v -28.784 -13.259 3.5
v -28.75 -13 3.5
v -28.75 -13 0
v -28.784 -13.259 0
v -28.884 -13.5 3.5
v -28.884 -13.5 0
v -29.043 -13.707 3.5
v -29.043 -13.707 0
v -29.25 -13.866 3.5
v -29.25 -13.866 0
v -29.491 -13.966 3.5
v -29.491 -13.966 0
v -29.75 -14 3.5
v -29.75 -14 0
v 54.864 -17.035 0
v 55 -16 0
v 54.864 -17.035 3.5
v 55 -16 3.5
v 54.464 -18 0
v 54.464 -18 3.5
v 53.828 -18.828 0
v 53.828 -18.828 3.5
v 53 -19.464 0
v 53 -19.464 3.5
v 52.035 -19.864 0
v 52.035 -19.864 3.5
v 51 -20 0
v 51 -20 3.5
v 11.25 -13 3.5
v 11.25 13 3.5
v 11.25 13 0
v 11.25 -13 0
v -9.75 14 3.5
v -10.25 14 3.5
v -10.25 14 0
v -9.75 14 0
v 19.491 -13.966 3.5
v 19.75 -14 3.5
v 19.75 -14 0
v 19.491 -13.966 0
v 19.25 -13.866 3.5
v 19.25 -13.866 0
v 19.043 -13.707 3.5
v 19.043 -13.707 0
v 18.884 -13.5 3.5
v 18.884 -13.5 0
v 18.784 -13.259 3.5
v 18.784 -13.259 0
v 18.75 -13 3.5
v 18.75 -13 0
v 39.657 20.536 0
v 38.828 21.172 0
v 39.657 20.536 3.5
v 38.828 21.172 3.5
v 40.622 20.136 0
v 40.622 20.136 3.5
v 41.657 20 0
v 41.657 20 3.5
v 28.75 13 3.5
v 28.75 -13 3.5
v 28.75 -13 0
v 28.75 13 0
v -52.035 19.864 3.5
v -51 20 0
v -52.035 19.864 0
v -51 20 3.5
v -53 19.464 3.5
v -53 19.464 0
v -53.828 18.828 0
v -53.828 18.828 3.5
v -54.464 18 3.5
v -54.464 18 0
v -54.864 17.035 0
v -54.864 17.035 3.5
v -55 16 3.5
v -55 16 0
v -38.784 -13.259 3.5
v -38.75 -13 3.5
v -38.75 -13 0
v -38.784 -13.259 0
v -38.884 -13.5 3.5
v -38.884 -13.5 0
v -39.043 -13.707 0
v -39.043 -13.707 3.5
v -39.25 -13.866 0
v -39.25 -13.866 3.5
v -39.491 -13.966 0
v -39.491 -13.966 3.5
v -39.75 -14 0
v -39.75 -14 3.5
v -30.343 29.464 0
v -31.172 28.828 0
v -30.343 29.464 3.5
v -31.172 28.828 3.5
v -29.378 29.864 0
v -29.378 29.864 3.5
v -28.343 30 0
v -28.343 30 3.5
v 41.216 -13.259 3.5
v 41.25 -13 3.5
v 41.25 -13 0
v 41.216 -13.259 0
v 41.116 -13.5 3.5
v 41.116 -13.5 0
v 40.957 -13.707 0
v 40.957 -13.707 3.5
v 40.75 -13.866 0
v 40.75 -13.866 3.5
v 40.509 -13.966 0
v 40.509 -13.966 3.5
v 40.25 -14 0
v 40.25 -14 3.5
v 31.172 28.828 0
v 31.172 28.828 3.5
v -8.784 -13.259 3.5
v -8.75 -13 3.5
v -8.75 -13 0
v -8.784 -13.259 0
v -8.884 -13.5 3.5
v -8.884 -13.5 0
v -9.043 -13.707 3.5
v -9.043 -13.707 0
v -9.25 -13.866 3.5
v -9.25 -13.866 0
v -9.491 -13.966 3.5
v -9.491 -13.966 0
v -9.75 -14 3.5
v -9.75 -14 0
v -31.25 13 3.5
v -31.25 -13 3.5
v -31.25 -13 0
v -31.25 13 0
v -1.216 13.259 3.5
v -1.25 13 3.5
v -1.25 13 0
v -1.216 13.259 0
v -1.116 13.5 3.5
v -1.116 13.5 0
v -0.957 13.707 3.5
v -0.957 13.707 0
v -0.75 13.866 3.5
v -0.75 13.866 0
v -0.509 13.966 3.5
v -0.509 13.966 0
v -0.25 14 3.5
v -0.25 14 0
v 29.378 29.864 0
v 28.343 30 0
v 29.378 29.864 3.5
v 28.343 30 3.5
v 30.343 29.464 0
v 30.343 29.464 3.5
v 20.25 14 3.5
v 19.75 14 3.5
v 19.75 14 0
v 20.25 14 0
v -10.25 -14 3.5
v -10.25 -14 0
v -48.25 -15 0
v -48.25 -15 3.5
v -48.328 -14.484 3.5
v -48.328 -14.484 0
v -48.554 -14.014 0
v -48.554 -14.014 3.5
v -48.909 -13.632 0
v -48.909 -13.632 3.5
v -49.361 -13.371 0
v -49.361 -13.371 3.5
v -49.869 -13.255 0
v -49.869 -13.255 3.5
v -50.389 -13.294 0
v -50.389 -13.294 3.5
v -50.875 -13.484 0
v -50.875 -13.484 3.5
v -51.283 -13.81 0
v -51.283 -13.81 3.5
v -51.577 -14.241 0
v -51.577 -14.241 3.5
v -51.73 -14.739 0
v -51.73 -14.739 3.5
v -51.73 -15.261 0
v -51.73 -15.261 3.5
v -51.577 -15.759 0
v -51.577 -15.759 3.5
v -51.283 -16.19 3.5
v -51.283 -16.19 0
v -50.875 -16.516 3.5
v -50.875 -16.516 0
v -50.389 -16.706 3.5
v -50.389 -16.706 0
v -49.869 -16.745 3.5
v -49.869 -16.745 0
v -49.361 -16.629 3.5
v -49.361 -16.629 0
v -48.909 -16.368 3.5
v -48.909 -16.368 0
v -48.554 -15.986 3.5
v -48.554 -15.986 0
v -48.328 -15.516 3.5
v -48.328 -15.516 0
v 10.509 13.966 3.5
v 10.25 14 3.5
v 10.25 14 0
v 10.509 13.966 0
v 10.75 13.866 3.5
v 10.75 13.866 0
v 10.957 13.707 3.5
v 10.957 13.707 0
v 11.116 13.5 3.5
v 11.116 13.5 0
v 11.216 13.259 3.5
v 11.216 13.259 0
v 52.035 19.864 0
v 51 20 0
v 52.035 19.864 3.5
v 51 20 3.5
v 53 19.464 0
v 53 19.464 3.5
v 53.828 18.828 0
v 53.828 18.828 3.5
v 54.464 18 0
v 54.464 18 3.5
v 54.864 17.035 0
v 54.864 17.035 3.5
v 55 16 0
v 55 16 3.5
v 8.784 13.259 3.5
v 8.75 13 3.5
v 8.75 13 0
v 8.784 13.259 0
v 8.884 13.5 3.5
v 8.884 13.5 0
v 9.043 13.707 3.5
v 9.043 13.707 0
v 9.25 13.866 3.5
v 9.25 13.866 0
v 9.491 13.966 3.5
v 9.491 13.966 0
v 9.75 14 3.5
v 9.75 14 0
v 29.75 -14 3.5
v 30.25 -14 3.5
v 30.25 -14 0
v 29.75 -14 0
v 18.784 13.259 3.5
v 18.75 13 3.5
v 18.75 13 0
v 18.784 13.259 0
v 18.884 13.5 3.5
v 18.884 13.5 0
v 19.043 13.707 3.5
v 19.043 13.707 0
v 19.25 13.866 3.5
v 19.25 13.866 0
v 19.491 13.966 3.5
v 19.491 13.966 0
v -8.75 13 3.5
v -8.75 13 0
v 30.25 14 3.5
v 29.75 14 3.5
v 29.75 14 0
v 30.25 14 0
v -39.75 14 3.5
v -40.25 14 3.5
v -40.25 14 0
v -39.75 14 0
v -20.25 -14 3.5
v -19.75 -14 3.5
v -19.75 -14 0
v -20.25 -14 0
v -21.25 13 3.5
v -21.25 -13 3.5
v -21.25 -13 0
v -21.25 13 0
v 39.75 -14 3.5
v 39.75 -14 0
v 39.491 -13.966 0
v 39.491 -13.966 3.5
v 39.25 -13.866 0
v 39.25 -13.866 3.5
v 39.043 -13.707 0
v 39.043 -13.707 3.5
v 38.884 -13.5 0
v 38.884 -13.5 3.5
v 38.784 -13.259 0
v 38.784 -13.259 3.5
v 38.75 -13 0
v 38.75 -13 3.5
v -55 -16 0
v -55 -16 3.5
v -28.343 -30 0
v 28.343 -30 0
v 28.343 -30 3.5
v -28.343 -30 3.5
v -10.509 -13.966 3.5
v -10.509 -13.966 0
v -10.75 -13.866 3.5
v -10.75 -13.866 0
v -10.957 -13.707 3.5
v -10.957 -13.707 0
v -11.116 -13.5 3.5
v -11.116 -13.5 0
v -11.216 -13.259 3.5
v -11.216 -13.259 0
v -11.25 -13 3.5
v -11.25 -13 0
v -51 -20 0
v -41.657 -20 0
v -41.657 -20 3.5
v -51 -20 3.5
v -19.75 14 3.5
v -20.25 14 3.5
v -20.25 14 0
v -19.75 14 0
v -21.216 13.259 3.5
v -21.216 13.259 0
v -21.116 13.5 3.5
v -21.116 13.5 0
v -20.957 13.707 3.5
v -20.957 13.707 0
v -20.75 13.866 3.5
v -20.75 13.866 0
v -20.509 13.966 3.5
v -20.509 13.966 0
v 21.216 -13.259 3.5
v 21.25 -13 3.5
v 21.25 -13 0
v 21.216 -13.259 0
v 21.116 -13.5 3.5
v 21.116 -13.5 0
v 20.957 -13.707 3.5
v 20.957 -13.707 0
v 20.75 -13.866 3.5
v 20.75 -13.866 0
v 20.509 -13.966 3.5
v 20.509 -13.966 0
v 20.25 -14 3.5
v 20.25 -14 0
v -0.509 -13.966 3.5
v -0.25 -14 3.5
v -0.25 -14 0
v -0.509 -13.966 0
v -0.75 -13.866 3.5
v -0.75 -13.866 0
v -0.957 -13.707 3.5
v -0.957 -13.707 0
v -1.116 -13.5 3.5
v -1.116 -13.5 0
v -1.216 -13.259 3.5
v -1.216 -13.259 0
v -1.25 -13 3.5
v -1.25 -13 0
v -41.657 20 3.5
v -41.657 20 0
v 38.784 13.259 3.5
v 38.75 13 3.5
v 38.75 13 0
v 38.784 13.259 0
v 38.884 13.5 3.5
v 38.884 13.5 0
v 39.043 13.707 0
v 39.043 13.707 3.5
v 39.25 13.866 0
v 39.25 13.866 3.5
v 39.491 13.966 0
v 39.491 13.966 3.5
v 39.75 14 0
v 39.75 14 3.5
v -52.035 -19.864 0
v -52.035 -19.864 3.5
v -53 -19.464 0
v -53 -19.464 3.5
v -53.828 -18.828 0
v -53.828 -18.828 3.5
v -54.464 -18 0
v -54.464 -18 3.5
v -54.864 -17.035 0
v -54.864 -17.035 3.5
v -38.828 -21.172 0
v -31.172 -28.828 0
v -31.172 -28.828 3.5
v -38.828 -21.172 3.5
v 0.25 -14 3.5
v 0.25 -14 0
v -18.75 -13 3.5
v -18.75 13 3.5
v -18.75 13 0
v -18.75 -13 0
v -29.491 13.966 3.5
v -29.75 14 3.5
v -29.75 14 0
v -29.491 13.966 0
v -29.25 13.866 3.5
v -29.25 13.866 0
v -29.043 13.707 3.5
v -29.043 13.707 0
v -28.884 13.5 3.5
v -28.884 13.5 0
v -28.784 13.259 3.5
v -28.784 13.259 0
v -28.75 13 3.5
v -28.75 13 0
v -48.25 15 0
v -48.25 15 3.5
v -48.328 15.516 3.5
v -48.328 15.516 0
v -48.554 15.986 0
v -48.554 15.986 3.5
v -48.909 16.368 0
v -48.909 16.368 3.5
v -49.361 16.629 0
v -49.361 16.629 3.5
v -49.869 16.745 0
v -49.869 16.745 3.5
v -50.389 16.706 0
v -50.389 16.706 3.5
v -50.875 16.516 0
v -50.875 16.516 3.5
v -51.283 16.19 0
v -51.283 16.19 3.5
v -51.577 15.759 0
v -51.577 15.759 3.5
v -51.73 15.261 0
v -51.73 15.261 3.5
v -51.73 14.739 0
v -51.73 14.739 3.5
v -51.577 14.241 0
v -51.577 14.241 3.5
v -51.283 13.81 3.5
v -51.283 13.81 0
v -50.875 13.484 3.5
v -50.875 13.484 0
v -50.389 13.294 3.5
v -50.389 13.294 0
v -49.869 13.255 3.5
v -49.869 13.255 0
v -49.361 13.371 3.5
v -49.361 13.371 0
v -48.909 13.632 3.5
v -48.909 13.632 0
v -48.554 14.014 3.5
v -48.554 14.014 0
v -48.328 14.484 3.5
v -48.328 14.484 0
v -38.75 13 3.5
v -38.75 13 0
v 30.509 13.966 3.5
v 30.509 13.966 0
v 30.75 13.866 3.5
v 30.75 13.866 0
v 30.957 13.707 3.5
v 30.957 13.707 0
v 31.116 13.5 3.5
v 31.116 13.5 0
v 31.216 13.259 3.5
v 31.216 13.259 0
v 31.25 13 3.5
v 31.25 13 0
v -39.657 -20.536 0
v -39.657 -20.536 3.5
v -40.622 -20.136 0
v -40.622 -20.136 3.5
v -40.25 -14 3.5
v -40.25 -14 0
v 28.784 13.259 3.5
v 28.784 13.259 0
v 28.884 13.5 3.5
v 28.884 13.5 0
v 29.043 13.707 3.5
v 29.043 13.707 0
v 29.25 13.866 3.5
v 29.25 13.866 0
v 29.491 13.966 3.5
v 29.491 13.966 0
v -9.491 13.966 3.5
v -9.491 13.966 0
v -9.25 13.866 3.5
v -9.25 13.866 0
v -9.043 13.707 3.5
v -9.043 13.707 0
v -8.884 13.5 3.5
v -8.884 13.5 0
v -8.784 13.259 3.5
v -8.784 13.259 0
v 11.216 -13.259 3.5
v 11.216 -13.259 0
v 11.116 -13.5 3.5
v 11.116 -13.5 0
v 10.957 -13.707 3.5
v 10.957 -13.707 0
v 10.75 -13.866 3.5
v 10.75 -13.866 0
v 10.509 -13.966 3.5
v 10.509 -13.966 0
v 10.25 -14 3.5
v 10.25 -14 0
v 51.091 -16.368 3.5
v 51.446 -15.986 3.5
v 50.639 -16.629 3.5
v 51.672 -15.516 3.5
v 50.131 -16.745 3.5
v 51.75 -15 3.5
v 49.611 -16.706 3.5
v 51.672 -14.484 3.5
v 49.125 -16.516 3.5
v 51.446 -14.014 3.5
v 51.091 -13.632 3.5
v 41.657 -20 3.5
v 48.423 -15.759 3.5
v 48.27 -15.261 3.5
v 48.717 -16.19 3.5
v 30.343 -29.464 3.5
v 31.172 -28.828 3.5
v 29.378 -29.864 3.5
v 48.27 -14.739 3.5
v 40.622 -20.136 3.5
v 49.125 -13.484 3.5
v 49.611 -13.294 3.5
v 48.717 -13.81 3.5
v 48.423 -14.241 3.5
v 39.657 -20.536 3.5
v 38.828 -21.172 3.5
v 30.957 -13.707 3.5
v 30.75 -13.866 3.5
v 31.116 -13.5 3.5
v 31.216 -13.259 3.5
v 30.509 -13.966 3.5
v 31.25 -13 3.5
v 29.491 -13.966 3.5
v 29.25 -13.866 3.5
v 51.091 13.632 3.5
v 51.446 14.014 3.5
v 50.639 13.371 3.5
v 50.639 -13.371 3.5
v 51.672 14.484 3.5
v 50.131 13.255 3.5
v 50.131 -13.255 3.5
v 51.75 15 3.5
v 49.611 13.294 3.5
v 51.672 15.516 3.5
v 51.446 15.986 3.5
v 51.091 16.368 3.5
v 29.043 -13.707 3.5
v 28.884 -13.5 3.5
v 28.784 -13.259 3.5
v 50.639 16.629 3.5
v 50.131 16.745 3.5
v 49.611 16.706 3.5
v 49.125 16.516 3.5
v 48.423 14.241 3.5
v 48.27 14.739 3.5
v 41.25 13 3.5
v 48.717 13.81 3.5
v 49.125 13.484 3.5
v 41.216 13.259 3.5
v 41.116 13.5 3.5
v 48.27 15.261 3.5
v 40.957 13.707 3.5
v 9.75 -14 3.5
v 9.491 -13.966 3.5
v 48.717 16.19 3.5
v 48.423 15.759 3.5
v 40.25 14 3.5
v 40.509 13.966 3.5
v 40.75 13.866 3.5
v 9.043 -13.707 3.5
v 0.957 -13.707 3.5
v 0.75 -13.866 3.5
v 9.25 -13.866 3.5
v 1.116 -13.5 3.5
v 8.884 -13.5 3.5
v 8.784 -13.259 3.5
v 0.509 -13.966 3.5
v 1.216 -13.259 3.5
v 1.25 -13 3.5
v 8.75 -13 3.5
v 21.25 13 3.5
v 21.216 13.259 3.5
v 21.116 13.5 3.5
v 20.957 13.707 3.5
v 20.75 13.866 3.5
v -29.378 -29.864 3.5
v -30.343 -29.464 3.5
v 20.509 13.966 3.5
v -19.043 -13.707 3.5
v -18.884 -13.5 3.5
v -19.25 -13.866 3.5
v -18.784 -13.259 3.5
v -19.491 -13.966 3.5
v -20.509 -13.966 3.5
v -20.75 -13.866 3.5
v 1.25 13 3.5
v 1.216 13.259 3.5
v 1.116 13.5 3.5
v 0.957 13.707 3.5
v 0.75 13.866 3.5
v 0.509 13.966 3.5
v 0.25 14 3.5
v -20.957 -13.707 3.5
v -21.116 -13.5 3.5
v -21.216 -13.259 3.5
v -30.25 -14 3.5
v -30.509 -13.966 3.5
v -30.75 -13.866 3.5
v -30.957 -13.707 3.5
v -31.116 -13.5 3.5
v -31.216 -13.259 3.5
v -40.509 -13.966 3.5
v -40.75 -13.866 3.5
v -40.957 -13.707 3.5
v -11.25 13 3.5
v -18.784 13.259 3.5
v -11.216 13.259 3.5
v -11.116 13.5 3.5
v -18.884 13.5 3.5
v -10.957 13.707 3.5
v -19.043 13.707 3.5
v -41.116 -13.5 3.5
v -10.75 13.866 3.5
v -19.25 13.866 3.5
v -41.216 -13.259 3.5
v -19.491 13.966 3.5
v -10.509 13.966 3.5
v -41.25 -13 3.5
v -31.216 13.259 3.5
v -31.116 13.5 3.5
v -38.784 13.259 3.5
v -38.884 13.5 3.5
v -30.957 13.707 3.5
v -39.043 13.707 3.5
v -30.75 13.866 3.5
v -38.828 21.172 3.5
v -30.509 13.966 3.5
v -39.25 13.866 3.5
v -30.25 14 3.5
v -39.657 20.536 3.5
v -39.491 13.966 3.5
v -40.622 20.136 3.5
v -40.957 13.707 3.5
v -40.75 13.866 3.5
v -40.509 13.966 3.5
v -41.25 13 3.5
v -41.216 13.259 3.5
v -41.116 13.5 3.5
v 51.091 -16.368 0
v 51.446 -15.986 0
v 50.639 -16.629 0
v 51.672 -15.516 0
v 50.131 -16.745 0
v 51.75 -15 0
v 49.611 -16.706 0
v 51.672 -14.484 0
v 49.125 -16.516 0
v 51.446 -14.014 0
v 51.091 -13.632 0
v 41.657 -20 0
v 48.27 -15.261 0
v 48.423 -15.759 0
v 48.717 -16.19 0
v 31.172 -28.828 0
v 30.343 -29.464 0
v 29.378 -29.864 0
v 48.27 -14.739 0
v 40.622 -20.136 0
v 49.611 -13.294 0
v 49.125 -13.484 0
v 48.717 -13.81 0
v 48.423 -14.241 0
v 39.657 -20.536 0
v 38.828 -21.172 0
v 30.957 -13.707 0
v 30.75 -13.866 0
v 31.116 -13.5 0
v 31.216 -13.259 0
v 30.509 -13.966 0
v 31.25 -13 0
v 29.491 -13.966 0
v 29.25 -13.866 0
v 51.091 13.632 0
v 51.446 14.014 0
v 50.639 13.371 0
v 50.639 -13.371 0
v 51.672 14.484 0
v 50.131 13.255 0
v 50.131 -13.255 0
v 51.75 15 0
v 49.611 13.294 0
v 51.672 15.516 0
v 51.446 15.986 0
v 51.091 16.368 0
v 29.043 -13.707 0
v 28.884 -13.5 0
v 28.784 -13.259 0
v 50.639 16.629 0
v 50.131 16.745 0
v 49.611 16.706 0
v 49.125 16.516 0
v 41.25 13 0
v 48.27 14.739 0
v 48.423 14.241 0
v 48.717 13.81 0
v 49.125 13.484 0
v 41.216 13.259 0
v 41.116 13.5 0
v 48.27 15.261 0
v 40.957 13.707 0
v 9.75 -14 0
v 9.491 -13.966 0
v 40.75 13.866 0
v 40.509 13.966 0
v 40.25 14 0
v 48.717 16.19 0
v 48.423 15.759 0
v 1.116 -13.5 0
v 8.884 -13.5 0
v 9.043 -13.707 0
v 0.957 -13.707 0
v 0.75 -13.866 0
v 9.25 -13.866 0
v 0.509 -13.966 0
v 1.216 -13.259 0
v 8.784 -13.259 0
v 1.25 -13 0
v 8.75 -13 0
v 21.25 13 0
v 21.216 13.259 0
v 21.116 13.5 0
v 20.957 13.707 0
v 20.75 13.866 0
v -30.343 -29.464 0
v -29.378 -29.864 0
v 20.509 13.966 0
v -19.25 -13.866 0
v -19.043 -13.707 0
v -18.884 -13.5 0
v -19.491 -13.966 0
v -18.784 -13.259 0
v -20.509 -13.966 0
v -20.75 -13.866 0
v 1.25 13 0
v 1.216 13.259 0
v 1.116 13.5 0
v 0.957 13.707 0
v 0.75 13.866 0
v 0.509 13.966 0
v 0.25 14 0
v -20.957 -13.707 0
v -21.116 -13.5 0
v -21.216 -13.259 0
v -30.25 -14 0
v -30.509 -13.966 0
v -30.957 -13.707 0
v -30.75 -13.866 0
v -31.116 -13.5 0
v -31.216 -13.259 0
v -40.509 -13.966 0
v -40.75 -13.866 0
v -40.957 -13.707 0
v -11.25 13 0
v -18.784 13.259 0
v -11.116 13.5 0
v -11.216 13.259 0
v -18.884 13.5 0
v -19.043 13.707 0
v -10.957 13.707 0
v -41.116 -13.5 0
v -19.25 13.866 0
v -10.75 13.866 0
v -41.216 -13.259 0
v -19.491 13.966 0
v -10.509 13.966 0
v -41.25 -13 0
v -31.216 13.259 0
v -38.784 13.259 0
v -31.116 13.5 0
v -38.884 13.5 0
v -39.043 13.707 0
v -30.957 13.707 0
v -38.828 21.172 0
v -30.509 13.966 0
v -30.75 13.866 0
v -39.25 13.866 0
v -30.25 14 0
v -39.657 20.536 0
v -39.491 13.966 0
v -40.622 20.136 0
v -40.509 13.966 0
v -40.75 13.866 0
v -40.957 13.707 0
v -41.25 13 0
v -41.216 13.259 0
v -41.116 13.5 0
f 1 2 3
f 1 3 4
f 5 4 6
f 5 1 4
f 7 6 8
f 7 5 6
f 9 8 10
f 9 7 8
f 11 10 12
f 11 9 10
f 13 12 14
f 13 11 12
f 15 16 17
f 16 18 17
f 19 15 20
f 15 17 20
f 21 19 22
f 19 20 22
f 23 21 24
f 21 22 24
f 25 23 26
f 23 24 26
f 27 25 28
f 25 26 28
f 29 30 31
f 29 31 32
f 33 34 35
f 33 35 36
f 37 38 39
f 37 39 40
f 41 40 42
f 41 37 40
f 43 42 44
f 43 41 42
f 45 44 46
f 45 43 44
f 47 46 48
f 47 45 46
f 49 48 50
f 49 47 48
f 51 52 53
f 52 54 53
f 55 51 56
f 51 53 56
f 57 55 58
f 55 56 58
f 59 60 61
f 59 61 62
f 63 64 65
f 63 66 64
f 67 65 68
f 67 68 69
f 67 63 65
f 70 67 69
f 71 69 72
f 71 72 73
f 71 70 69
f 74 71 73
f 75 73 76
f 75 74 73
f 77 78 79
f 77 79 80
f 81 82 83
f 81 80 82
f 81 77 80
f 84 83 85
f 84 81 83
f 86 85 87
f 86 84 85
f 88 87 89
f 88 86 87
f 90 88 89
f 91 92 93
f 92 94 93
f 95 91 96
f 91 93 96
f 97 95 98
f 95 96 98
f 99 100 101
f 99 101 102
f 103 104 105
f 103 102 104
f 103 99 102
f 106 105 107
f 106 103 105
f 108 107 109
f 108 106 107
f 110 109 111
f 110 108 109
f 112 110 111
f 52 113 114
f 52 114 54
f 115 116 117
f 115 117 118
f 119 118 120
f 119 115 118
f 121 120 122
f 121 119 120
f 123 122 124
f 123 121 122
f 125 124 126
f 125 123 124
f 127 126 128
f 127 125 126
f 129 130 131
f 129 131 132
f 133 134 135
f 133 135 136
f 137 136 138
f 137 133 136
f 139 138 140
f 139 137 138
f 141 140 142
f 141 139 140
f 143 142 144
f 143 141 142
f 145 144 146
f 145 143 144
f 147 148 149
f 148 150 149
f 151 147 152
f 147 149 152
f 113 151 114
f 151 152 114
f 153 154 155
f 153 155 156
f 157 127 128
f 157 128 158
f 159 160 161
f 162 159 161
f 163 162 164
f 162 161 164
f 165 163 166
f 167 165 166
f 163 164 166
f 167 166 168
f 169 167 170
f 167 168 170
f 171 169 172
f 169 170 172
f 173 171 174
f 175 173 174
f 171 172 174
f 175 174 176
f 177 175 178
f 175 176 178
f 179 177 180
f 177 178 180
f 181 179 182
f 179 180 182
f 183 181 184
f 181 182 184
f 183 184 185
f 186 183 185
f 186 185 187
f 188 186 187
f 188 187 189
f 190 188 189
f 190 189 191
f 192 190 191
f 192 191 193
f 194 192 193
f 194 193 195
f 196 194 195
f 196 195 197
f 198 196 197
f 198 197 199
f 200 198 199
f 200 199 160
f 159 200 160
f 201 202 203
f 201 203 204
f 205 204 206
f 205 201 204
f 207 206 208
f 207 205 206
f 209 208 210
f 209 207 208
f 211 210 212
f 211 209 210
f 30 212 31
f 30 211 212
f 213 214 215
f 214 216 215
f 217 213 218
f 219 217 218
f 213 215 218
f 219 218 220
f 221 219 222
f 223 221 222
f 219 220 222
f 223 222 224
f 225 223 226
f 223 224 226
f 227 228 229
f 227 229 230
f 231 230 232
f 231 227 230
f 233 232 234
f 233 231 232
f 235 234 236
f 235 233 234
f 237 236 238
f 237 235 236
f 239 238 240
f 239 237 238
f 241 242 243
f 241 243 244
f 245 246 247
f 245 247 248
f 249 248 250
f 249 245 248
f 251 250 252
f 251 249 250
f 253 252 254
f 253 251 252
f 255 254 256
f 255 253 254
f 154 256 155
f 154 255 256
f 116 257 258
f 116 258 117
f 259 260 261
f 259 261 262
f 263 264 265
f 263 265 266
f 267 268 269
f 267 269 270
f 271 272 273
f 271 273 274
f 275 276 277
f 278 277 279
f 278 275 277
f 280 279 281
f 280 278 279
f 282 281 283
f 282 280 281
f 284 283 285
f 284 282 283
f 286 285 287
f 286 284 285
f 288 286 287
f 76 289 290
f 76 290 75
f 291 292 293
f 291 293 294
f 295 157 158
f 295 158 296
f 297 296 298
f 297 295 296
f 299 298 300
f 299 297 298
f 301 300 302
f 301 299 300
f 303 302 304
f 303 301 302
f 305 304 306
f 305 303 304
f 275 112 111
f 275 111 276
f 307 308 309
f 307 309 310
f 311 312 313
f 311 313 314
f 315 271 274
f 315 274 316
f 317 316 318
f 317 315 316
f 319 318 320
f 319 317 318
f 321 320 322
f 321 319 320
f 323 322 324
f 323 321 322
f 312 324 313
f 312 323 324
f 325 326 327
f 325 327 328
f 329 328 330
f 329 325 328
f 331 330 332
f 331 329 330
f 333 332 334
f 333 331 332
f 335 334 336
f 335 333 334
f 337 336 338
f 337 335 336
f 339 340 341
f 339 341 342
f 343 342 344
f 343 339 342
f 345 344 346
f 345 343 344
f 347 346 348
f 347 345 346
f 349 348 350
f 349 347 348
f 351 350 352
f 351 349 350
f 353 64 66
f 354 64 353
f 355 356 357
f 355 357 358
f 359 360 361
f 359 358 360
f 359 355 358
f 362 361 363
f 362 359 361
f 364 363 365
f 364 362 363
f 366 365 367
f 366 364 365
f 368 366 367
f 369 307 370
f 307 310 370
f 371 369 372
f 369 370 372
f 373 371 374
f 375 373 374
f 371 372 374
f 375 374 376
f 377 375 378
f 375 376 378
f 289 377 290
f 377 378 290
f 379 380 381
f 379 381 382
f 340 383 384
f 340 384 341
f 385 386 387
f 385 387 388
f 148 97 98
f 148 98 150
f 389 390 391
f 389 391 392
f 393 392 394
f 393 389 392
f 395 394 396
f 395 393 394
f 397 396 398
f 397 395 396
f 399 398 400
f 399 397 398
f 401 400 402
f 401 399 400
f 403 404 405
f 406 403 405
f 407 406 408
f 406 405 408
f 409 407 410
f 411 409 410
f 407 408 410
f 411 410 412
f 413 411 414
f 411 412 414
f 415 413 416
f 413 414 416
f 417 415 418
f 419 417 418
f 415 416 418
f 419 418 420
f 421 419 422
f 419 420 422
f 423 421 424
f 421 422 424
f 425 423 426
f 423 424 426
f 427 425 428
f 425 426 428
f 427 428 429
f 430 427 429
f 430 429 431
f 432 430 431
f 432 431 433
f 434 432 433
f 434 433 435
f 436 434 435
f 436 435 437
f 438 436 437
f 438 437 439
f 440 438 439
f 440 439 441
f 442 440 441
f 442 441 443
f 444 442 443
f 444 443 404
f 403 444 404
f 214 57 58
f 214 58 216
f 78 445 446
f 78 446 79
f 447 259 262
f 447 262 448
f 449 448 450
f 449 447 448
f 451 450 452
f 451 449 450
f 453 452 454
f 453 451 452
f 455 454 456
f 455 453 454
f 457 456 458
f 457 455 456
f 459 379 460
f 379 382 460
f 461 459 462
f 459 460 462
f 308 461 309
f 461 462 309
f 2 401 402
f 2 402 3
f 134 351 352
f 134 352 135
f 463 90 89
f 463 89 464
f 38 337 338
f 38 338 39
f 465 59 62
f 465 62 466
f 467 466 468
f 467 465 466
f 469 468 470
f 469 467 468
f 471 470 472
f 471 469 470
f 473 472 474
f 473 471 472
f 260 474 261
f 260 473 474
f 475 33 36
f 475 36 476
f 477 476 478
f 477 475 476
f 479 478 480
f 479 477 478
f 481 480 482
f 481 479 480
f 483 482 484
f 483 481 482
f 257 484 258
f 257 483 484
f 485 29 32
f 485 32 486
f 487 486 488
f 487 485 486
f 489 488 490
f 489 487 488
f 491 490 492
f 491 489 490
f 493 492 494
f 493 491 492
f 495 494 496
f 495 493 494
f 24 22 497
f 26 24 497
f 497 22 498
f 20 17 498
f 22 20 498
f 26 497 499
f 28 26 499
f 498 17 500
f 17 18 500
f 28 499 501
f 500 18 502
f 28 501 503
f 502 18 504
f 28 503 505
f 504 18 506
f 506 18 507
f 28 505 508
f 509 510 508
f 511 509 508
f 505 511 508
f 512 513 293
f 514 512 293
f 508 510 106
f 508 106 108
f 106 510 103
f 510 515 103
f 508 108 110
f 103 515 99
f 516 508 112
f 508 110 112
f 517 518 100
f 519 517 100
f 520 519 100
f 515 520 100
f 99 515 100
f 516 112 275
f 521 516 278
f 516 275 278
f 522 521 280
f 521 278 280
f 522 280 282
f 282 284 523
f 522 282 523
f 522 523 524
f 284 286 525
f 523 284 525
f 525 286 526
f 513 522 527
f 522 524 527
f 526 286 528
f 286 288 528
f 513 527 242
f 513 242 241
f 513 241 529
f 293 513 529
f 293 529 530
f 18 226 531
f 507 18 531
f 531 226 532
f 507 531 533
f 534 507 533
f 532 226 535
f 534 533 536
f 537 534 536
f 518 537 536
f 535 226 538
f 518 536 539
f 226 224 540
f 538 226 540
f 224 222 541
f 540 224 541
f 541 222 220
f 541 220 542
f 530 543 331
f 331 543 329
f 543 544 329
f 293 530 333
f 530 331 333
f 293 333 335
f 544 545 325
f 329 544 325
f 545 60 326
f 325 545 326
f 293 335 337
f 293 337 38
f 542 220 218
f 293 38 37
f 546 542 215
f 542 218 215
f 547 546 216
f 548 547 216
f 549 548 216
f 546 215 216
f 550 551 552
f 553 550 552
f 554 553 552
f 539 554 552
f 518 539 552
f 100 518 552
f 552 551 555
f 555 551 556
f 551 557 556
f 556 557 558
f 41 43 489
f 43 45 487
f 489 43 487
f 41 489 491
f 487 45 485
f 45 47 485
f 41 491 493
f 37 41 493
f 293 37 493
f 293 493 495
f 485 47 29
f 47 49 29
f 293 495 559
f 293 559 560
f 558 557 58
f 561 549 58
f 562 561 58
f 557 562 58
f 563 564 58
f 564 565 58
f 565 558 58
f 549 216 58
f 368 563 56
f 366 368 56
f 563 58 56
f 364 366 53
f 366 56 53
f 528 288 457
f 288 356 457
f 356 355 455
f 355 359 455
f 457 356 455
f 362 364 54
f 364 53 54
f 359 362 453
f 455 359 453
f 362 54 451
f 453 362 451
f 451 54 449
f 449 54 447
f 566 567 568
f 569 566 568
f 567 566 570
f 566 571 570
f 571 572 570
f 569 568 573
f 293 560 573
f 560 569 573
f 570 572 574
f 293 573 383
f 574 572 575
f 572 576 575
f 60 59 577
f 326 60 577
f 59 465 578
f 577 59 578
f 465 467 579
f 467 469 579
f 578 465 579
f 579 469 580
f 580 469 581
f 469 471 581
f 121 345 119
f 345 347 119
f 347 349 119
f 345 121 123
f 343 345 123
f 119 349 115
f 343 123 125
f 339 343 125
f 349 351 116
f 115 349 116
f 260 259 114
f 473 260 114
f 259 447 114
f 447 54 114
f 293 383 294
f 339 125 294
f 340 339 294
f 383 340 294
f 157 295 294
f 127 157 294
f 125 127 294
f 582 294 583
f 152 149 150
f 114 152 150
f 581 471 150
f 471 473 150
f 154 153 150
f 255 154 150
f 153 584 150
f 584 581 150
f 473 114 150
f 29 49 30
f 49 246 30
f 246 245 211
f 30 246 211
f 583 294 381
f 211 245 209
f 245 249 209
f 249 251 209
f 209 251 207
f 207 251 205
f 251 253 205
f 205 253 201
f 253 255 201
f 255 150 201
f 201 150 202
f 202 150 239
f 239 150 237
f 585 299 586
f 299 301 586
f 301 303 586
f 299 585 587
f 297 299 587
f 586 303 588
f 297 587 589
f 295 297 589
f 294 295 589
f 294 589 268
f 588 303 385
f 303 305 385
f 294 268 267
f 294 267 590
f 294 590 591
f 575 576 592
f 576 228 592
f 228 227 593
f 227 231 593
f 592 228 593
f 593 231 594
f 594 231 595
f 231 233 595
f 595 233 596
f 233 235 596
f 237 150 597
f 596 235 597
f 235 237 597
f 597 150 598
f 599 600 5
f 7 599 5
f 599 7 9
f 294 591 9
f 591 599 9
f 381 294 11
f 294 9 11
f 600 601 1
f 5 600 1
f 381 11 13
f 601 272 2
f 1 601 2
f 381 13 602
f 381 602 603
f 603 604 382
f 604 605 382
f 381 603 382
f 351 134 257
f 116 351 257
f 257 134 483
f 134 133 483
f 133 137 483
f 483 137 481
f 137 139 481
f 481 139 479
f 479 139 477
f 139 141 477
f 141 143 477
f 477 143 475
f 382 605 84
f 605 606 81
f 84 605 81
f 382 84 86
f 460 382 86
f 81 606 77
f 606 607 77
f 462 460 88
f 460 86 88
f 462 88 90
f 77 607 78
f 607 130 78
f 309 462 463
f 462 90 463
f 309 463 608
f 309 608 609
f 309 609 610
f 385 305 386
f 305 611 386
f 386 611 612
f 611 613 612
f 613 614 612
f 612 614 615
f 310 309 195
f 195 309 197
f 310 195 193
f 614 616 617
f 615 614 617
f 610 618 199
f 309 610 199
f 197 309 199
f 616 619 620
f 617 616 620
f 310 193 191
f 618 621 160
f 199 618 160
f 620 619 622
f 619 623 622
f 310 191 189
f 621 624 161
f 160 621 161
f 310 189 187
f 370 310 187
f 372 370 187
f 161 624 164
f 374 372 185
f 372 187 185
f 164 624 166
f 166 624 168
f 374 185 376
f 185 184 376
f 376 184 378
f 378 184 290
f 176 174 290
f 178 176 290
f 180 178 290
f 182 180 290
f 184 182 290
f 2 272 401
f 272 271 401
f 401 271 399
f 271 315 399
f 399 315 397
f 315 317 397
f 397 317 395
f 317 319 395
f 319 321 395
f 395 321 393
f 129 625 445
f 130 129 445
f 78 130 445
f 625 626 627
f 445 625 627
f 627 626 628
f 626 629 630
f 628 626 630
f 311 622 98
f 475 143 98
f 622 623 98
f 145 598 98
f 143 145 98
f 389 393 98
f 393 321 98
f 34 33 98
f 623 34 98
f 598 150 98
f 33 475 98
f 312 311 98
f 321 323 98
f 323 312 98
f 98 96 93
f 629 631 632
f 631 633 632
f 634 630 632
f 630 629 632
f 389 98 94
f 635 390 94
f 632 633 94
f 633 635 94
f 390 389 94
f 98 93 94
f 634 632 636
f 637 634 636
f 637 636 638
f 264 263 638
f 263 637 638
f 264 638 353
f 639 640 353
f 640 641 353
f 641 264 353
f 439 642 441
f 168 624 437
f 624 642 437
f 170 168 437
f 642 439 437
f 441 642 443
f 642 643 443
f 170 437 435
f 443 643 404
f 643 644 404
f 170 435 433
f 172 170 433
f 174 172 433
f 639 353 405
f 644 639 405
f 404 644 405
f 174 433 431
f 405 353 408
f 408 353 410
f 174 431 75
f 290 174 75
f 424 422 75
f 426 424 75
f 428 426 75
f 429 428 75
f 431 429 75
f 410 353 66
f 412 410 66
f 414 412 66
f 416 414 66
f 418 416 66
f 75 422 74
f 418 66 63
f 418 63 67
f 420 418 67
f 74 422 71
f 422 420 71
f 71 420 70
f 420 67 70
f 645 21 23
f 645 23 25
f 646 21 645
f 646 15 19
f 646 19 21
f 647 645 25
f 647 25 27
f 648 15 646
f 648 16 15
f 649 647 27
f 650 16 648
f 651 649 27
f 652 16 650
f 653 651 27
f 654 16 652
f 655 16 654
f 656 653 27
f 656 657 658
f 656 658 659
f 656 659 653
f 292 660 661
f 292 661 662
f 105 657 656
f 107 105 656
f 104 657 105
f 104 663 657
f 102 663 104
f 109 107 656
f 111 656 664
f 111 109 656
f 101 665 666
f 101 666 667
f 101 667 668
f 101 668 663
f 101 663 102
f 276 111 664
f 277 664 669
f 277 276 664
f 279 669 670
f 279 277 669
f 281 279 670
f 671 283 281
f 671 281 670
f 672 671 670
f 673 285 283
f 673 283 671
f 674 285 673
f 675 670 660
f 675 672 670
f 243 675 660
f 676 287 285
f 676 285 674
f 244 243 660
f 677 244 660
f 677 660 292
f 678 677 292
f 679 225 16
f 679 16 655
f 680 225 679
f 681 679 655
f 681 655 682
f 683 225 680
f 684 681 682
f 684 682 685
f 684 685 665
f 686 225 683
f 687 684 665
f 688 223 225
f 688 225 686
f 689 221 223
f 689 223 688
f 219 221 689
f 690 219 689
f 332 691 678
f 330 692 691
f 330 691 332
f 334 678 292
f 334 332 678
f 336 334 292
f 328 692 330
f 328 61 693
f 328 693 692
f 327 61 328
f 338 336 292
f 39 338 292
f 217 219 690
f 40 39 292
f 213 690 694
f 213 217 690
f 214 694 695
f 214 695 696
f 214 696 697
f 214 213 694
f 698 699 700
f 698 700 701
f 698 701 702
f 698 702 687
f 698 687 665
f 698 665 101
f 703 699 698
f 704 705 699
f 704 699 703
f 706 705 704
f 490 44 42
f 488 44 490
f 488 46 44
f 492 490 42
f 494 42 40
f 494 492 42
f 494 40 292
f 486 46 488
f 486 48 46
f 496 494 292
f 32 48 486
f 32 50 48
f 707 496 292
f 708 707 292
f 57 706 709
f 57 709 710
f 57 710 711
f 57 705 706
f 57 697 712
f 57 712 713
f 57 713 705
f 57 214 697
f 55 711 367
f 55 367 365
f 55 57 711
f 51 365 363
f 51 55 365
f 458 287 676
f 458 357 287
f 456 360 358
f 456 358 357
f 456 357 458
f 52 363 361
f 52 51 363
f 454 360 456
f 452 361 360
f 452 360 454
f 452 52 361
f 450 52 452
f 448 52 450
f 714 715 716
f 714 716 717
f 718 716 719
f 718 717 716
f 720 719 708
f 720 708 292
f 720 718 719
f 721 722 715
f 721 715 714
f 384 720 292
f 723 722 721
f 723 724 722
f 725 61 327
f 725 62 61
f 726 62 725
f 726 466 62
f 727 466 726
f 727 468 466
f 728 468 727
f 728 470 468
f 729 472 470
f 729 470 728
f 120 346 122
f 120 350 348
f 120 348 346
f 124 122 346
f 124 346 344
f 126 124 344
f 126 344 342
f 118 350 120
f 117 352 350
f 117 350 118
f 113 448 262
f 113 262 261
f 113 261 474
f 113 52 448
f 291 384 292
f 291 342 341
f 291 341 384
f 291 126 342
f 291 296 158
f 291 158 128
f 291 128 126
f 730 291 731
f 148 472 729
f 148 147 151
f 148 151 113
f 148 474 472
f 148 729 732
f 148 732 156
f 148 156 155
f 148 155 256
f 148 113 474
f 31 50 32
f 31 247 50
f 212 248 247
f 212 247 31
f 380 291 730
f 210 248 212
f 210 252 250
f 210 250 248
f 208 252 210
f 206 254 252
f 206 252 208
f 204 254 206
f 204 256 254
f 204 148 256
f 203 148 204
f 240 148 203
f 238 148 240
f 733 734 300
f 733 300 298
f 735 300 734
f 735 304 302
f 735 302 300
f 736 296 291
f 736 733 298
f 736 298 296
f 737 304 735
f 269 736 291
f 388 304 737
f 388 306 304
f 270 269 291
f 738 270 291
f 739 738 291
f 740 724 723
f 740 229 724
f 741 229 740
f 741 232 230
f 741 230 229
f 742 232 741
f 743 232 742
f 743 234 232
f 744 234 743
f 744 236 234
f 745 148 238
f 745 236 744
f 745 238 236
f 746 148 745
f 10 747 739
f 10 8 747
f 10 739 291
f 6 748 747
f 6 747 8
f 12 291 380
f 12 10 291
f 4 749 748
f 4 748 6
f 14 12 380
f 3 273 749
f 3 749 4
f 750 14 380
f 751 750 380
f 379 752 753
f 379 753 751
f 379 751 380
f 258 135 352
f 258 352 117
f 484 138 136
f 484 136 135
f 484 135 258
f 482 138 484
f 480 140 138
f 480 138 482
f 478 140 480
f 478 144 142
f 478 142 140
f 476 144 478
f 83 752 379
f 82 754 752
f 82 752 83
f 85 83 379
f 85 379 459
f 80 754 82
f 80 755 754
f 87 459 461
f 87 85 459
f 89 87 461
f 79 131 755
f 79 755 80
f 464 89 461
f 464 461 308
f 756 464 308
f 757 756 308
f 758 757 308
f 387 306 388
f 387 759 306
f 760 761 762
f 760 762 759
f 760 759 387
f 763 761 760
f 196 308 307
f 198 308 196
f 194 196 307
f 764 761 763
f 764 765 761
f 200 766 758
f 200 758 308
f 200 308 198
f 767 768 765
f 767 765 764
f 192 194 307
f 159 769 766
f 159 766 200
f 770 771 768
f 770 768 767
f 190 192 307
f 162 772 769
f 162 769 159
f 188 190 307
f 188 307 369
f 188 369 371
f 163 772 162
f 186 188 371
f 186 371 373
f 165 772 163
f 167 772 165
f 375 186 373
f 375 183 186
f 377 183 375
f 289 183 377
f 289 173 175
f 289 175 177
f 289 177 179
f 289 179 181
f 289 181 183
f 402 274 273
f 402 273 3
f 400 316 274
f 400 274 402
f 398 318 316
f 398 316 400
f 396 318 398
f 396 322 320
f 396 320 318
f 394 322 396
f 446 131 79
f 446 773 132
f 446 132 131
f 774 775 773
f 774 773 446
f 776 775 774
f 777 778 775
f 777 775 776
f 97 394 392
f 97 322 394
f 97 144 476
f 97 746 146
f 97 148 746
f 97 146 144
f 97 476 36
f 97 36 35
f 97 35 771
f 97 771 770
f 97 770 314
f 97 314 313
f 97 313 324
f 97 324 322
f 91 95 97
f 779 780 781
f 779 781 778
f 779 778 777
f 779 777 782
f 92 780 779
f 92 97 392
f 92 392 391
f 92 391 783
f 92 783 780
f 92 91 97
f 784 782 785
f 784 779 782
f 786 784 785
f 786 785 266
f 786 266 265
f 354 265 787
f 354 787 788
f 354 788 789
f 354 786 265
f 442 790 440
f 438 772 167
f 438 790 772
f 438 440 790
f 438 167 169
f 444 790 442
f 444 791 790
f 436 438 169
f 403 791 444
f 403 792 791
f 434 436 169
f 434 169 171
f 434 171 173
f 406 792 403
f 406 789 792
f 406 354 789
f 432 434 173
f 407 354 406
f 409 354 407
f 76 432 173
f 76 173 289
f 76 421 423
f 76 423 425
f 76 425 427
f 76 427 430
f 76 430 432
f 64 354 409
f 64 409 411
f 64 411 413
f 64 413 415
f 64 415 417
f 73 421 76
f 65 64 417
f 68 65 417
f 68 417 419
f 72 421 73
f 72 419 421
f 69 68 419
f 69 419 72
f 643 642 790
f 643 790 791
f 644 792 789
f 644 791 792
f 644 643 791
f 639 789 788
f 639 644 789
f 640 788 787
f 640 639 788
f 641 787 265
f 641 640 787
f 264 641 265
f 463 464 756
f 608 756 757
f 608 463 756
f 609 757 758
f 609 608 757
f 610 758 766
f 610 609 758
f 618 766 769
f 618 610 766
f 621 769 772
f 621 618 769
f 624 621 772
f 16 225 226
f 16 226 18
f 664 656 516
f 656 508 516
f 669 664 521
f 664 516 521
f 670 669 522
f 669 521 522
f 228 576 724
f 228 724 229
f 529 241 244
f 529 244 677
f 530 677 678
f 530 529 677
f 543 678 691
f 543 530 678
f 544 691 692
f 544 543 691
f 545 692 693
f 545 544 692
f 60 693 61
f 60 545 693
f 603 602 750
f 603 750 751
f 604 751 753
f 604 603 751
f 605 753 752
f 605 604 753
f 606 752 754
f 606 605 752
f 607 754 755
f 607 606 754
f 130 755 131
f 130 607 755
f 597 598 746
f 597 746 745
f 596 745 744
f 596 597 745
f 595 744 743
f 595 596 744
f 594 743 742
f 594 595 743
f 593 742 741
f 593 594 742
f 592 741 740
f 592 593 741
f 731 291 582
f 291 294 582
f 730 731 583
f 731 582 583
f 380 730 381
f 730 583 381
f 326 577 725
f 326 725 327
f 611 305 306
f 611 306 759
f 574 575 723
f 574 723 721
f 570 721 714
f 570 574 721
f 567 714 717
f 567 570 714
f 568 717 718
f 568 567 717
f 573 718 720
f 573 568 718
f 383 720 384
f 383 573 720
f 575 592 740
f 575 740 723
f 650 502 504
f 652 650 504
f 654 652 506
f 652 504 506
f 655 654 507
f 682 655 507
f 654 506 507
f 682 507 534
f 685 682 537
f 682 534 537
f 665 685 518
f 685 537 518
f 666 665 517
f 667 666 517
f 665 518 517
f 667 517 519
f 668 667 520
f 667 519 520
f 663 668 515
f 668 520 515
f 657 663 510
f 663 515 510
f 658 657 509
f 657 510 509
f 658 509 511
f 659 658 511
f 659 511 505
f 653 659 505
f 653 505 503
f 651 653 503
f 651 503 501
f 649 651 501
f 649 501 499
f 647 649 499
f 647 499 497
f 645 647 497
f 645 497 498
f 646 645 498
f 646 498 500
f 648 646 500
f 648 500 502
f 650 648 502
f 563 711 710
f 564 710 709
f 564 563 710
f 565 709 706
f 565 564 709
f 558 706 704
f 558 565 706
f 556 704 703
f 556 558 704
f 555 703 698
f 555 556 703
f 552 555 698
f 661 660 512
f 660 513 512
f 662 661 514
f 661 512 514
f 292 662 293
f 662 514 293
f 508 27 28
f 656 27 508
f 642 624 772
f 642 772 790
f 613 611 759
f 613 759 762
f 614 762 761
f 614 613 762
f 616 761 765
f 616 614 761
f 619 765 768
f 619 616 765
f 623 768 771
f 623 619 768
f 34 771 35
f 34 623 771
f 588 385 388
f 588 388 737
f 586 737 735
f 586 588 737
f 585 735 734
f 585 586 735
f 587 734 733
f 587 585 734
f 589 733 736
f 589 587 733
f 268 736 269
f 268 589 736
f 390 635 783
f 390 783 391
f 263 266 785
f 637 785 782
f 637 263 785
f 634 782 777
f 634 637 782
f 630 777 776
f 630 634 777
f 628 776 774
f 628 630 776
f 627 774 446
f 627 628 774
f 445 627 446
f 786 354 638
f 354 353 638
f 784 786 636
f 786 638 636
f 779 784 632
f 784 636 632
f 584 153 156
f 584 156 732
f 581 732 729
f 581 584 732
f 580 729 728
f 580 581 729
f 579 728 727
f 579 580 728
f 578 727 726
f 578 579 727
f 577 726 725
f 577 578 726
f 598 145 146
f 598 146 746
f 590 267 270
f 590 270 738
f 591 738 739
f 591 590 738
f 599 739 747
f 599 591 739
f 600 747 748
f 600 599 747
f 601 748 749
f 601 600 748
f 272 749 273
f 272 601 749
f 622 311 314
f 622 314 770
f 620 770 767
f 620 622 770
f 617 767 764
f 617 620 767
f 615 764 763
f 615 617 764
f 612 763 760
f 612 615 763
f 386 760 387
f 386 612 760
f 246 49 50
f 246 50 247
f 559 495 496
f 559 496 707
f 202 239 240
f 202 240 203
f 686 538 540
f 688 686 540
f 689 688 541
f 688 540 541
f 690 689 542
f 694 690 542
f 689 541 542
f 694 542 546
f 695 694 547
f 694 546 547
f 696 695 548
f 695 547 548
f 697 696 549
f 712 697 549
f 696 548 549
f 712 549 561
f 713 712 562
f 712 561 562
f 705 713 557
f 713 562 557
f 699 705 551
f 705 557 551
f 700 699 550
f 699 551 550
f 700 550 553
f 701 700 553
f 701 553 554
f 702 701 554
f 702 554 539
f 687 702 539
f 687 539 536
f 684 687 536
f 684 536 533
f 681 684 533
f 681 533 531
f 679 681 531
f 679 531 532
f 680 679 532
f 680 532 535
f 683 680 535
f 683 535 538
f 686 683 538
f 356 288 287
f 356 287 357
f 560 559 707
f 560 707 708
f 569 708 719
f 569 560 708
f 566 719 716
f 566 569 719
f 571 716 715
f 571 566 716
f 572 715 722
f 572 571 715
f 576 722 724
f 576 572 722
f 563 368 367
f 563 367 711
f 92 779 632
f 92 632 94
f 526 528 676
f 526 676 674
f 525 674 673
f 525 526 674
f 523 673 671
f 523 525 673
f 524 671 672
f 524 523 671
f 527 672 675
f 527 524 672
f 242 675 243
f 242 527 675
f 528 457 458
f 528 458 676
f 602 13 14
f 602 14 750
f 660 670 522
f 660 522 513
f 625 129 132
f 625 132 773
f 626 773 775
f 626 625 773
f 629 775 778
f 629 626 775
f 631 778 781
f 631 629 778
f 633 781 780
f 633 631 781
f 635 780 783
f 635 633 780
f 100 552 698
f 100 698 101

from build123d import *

# Parameters (mm, degrees)
BOSS_EXTRUDE1_DEPTH = 3.5
FILLET1_R           = 4
SKETCH2_R           = 1.75
CUT_EXTRUDE1_DEPTH  = 63.747509911
CUT_EXTRUDE2_DEPTH  = 63.747509911
LPATTERN1_COUNT     = 5
LPATTERN1_PITCH     = 10
LPATTERN1_COL_COUNT = 5
LPATTERN1_COL_PITCH = 10


with BuildPart() as part:
    # Sketch1 → Boss-Extrude1 (new body)
    with BuildSketch(Plane.XY):
        Polygon((-55, 20), (-40, 20), (-30, 30), (30, 30), (40, 20), (55, 20), (55, -20), (40, -20), (30, -30), (-30, -30), (-40, -20), (-55, -20), align=None)
    extrude(amount=BOSS_EXTRUDE1_DEPTH)

    # Fillet1
    fillet1_edges = [part.edges().sort_by_distance(p)[0] for p in [
        (-55, -20, 1.75),
        (-55, 20, 1.75),
        (-40, 20, 1.75),
        (-30, 30, 1.75),
        (30, 30, 1.75),
        (40, 20, 1.75),
        (55, 20, 1.75),
        (55, -20, 1.75),
        (40, -20, 1.75),
        (30, -30, 1.75),
        (-30, -30, 1.75),
        (-40, -20, 1.75),
    ]]
    fillet(fillet1_edges, radius=FILLET1_R)

    # Sketch2 → Cut-Extrude1 (cut, through all)
    with BuildSketch(Plane.XY.offset(3.5)):
        with Locations((-50, 15)):
            Circle(SKETCH2_R)
        with Locations((-50, -15)):
            Circle(SKETCH2_R)
        with Locations((50, -15)):
            Circle(SKETCH2_R)
        with Locations((50, 15)):
            Circle(SKETCH2_R)
    extrude(amount=-CUT_EXTRUDE1_DEPTH, mode=Mode.SUBTRACT)

    # Sketch3 → Cut-Extrude2 (cut, through all)
    with BuildSketch(Plane.XY.offset(3.5)):
        with BuildLine():
            Line((-0.25, 14), (0.25, 14))
            ThreePointArc((0.25, 14), (0.957106781, 13.707106781), (1.25, 13))
            Line((1.25, 13), (1.25, -13))
            ThreePointArc((1.25, -13), (0.957106781, -13.707106781), (0.25, -14))
            Line((0.25, -14), (-0.25, -14))
            ThreePointArc((-0.25, -14), (-0.957106781, -13.707106781), (-1.25, -13))
            Line((-1.25, -13), (-1.25, 13))
            ThreePointArc((-1.25, 13), (-0.957106781, 13.707106781), (-0.25, 14))
        make_face()
    cut_extrude2 = extrude(amount=-CUT_EXTRUDE2_DEPTH, mode=Mode.SUBTRACT)

    # LPattern1: Cut-Extrude2 ×5
    with Locations(*[(-i * LPATTERN1_PITCH, 0, 0) for i in range(1, LPATTERN1_COUNT)]):
        add(cut_extrude2, mode=Mode.SUBTRACT)

    # LPattern1 col: Cut-Extrude2 ×5
    with Locations(*[(i * LPATTERN1_COL_PITCH, 0, 0) for i in range(1, LPATTERN1_COL_COUNT)]):
        add(cut_extrude2, mode=Mode.SUBTRACT)


solid = part.part
